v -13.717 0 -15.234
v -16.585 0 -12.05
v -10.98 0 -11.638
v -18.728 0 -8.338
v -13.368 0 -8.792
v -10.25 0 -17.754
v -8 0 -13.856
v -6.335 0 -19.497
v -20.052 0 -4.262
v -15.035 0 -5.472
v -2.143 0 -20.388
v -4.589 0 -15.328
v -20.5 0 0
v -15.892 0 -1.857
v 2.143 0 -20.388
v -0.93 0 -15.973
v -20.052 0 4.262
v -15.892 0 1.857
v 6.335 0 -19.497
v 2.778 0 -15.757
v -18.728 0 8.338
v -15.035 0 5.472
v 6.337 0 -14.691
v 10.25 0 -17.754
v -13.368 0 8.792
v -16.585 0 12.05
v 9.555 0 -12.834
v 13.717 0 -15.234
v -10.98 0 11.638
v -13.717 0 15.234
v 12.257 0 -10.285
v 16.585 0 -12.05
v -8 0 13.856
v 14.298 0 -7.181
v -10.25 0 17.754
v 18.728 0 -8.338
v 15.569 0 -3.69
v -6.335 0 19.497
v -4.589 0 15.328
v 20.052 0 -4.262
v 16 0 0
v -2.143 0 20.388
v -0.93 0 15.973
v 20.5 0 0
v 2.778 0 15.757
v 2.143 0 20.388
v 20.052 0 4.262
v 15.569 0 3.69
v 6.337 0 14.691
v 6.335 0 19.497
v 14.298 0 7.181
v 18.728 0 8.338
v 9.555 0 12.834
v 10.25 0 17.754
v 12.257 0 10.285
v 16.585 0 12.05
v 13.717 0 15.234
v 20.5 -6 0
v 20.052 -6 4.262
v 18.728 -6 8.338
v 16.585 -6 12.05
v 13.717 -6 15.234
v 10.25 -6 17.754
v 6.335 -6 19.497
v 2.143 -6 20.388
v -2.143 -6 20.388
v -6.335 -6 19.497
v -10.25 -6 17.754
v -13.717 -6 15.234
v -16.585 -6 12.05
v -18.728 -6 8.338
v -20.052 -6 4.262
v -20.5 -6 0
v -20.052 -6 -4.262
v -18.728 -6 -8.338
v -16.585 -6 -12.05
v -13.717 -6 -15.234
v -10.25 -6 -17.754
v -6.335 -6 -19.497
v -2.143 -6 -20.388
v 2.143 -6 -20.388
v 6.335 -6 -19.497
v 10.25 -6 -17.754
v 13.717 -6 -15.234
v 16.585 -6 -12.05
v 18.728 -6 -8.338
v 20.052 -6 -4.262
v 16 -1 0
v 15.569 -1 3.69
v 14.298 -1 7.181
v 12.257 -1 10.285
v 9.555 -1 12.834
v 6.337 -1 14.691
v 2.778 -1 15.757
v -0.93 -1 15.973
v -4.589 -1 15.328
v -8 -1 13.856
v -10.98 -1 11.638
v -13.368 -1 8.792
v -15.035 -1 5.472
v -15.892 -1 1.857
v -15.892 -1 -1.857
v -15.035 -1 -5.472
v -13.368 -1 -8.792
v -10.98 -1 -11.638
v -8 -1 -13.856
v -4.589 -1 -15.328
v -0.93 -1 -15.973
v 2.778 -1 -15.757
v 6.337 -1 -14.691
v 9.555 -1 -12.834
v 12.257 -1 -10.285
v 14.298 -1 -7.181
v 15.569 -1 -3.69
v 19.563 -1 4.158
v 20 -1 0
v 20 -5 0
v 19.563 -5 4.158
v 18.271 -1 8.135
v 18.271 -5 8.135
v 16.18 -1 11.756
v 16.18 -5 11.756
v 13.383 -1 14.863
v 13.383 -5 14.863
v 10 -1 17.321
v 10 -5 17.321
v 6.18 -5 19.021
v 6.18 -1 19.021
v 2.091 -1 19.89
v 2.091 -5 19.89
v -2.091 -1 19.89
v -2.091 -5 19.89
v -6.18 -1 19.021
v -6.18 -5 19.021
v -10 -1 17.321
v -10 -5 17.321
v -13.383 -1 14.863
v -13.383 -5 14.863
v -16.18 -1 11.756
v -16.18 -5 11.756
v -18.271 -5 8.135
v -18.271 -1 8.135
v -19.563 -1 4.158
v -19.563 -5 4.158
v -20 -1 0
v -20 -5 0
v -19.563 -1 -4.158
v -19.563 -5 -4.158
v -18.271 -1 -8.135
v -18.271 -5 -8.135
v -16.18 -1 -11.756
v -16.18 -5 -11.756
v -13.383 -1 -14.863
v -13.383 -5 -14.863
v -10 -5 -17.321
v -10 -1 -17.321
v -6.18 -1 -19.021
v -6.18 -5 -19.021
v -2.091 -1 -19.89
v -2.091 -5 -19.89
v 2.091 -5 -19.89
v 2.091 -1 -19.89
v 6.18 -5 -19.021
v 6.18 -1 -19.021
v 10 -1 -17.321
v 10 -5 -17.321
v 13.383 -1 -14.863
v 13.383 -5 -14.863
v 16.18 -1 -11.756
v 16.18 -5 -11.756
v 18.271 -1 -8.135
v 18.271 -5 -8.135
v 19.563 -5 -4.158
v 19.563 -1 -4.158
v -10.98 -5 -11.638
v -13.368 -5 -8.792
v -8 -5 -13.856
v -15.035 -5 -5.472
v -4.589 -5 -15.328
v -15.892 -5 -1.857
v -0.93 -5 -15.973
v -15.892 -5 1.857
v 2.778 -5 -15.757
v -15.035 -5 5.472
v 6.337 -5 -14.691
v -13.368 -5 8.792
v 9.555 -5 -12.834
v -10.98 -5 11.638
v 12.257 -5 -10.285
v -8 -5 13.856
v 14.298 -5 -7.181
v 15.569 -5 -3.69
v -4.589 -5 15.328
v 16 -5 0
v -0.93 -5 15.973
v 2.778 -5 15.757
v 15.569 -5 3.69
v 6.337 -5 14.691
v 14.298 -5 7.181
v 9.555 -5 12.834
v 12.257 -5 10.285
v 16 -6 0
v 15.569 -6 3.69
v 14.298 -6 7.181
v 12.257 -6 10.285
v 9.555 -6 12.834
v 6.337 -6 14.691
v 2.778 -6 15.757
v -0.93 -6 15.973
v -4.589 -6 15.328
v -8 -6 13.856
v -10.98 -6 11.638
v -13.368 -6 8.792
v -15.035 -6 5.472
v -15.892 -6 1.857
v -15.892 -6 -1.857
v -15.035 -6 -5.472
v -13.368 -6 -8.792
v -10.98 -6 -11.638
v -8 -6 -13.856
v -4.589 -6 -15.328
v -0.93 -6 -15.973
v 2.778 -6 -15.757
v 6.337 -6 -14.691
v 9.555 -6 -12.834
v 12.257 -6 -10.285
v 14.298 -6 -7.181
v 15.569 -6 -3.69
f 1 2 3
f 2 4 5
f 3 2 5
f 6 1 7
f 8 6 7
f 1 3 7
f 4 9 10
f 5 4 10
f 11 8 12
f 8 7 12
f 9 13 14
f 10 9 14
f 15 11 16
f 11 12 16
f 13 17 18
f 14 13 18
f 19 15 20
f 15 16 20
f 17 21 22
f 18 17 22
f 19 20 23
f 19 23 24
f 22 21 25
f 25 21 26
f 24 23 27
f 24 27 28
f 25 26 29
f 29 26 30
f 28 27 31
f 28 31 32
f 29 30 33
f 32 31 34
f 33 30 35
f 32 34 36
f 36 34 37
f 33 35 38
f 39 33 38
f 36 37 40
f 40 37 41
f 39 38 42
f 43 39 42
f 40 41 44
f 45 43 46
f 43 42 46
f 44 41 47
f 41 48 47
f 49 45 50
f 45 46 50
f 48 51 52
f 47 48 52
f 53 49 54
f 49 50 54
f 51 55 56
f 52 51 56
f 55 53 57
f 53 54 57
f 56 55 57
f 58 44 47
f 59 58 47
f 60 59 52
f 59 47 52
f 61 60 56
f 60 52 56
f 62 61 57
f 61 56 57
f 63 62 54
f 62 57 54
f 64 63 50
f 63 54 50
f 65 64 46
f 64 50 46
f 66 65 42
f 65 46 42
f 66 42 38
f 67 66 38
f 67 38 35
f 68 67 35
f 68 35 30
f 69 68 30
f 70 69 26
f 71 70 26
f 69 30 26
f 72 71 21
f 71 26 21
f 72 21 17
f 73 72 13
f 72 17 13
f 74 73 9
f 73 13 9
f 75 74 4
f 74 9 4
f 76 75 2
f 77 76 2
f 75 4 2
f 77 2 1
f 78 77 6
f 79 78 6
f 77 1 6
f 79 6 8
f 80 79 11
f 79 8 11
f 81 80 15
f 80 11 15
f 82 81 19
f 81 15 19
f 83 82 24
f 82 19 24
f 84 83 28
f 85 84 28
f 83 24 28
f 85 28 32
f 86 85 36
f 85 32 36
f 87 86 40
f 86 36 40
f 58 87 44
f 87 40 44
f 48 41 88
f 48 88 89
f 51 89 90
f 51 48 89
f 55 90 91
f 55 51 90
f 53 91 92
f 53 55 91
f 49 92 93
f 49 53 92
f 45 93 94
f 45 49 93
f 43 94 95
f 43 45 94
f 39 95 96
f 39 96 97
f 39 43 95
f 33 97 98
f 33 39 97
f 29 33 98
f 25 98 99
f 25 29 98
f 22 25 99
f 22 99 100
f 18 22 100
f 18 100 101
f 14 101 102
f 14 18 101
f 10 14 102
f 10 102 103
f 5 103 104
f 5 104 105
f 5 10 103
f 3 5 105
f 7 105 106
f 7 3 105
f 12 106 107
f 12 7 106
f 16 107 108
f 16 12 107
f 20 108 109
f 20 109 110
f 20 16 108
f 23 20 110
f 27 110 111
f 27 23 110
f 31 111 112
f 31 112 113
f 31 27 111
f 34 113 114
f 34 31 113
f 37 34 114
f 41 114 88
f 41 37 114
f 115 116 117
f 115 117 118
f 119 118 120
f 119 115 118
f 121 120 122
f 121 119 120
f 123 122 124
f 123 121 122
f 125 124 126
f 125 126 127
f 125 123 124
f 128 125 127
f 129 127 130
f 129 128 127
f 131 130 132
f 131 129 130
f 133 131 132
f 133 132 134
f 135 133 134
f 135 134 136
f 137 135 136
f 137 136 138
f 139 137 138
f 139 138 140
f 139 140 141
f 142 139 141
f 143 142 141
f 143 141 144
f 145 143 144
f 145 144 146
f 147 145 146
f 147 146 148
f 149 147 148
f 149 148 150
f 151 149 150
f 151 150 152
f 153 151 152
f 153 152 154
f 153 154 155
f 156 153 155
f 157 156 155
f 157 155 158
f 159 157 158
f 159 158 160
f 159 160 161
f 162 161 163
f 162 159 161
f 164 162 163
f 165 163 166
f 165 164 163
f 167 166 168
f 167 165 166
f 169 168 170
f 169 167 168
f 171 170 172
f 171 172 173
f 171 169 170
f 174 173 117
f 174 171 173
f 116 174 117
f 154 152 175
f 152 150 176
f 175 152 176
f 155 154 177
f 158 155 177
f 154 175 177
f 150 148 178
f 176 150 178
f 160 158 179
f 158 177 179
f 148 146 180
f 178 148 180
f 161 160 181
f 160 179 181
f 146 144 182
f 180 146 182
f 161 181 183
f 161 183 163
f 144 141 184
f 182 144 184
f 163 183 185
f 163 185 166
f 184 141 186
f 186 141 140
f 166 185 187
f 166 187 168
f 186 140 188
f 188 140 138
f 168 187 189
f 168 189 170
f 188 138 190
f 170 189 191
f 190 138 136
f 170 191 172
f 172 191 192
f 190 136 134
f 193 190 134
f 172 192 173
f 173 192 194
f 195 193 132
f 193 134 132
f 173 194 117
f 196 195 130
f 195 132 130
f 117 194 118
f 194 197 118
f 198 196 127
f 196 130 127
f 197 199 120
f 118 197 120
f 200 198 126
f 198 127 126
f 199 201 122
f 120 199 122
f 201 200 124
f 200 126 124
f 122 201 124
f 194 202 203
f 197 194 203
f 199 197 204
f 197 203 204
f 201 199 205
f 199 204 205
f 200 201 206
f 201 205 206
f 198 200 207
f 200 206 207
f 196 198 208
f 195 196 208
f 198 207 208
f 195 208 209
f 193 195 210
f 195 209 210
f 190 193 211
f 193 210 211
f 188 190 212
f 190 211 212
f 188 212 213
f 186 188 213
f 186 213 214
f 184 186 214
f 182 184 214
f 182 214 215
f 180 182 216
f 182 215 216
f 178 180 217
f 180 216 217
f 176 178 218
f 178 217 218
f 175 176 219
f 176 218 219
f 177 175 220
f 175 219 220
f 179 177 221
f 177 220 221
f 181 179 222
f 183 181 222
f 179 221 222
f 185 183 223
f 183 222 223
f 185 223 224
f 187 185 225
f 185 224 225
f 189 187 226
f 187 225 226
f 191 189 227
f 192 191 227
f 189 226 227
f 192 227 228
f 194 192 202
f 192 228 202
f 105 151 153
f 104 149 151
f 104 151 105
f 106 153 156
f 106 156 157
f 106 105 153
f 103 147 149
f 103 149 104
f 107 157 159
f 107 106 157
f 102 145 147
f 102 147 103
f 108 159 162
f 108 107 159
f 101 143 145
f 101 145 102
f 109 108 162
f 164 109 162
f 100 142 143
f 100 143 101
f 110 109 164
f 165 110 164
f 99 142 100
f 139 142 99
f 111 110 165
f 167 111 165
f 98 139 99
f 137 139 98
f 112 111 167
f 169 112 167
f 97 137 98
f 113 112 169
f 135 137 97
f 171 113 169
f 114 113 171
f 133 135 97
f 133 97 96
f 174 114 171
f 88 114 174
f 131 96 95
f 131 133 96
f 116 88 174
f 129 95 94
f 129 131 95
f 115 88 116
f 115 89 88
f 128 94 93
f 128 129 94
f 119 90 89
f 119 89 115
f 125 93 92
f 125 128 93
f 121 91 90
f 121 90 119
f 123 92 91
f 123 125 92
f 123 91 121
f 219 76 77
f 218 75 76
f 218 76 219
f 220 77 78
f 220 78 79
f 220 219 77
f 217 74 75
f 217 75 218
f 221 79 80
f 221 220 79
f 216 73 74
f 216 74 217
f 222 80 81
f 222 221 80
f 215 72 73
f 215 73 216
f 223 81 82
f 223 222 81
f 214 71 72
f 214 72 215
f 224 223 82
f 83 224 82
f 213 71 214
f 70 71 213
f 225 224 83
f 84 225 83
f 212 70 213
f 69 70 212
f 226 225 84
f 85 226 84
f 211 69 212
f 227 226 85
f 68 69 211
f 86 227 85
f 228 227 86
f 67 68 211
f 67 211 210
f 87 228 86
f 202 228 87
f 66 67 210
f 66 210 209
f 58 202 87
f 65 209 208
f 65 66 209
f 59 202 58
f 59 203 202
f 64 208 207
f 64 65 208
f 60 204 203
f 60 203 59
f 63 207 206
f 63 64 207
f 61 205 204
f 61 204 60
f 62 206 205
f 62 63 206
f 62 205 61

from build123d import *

# Parameters (mm, degrees)
F0_R     = 20.5
F0_R_2   = 20
F1_DEPTH = 6
F0_R_3   = 16
F2_DEPTH = 1
F3_R     = 20
F3_R_2   = 16
F4_DEPTH = 1


with BuildPart() as f1:
    # F0 (on Front) → F1 (new body)
    with BuildSketch(Plane.XZ):
        Circle(F0_R)
        Circle(F0_R_2, mode=Mode.SUBTRACT)
    extrude(amount=F1_DEPTH)

    # F0 (on Front) → F2 (join)
    with BuildSketch(Plane.XZ):
        Circle(F0_R_2)
        Circle(F0_R_3, mode=Mode.SUBTRACT)
    extrude(amount=F2_DEPTH)

    # F3 (on face) → F4 (join)
    with BuildSketch(Plane.XZ.offset(6)):
        Circle(F3_R)
        Circle(F3_R_2, mode=Mode.SUBTRACT)
    extrude(amount=-F4_DEPTH)


solid = f1.part
